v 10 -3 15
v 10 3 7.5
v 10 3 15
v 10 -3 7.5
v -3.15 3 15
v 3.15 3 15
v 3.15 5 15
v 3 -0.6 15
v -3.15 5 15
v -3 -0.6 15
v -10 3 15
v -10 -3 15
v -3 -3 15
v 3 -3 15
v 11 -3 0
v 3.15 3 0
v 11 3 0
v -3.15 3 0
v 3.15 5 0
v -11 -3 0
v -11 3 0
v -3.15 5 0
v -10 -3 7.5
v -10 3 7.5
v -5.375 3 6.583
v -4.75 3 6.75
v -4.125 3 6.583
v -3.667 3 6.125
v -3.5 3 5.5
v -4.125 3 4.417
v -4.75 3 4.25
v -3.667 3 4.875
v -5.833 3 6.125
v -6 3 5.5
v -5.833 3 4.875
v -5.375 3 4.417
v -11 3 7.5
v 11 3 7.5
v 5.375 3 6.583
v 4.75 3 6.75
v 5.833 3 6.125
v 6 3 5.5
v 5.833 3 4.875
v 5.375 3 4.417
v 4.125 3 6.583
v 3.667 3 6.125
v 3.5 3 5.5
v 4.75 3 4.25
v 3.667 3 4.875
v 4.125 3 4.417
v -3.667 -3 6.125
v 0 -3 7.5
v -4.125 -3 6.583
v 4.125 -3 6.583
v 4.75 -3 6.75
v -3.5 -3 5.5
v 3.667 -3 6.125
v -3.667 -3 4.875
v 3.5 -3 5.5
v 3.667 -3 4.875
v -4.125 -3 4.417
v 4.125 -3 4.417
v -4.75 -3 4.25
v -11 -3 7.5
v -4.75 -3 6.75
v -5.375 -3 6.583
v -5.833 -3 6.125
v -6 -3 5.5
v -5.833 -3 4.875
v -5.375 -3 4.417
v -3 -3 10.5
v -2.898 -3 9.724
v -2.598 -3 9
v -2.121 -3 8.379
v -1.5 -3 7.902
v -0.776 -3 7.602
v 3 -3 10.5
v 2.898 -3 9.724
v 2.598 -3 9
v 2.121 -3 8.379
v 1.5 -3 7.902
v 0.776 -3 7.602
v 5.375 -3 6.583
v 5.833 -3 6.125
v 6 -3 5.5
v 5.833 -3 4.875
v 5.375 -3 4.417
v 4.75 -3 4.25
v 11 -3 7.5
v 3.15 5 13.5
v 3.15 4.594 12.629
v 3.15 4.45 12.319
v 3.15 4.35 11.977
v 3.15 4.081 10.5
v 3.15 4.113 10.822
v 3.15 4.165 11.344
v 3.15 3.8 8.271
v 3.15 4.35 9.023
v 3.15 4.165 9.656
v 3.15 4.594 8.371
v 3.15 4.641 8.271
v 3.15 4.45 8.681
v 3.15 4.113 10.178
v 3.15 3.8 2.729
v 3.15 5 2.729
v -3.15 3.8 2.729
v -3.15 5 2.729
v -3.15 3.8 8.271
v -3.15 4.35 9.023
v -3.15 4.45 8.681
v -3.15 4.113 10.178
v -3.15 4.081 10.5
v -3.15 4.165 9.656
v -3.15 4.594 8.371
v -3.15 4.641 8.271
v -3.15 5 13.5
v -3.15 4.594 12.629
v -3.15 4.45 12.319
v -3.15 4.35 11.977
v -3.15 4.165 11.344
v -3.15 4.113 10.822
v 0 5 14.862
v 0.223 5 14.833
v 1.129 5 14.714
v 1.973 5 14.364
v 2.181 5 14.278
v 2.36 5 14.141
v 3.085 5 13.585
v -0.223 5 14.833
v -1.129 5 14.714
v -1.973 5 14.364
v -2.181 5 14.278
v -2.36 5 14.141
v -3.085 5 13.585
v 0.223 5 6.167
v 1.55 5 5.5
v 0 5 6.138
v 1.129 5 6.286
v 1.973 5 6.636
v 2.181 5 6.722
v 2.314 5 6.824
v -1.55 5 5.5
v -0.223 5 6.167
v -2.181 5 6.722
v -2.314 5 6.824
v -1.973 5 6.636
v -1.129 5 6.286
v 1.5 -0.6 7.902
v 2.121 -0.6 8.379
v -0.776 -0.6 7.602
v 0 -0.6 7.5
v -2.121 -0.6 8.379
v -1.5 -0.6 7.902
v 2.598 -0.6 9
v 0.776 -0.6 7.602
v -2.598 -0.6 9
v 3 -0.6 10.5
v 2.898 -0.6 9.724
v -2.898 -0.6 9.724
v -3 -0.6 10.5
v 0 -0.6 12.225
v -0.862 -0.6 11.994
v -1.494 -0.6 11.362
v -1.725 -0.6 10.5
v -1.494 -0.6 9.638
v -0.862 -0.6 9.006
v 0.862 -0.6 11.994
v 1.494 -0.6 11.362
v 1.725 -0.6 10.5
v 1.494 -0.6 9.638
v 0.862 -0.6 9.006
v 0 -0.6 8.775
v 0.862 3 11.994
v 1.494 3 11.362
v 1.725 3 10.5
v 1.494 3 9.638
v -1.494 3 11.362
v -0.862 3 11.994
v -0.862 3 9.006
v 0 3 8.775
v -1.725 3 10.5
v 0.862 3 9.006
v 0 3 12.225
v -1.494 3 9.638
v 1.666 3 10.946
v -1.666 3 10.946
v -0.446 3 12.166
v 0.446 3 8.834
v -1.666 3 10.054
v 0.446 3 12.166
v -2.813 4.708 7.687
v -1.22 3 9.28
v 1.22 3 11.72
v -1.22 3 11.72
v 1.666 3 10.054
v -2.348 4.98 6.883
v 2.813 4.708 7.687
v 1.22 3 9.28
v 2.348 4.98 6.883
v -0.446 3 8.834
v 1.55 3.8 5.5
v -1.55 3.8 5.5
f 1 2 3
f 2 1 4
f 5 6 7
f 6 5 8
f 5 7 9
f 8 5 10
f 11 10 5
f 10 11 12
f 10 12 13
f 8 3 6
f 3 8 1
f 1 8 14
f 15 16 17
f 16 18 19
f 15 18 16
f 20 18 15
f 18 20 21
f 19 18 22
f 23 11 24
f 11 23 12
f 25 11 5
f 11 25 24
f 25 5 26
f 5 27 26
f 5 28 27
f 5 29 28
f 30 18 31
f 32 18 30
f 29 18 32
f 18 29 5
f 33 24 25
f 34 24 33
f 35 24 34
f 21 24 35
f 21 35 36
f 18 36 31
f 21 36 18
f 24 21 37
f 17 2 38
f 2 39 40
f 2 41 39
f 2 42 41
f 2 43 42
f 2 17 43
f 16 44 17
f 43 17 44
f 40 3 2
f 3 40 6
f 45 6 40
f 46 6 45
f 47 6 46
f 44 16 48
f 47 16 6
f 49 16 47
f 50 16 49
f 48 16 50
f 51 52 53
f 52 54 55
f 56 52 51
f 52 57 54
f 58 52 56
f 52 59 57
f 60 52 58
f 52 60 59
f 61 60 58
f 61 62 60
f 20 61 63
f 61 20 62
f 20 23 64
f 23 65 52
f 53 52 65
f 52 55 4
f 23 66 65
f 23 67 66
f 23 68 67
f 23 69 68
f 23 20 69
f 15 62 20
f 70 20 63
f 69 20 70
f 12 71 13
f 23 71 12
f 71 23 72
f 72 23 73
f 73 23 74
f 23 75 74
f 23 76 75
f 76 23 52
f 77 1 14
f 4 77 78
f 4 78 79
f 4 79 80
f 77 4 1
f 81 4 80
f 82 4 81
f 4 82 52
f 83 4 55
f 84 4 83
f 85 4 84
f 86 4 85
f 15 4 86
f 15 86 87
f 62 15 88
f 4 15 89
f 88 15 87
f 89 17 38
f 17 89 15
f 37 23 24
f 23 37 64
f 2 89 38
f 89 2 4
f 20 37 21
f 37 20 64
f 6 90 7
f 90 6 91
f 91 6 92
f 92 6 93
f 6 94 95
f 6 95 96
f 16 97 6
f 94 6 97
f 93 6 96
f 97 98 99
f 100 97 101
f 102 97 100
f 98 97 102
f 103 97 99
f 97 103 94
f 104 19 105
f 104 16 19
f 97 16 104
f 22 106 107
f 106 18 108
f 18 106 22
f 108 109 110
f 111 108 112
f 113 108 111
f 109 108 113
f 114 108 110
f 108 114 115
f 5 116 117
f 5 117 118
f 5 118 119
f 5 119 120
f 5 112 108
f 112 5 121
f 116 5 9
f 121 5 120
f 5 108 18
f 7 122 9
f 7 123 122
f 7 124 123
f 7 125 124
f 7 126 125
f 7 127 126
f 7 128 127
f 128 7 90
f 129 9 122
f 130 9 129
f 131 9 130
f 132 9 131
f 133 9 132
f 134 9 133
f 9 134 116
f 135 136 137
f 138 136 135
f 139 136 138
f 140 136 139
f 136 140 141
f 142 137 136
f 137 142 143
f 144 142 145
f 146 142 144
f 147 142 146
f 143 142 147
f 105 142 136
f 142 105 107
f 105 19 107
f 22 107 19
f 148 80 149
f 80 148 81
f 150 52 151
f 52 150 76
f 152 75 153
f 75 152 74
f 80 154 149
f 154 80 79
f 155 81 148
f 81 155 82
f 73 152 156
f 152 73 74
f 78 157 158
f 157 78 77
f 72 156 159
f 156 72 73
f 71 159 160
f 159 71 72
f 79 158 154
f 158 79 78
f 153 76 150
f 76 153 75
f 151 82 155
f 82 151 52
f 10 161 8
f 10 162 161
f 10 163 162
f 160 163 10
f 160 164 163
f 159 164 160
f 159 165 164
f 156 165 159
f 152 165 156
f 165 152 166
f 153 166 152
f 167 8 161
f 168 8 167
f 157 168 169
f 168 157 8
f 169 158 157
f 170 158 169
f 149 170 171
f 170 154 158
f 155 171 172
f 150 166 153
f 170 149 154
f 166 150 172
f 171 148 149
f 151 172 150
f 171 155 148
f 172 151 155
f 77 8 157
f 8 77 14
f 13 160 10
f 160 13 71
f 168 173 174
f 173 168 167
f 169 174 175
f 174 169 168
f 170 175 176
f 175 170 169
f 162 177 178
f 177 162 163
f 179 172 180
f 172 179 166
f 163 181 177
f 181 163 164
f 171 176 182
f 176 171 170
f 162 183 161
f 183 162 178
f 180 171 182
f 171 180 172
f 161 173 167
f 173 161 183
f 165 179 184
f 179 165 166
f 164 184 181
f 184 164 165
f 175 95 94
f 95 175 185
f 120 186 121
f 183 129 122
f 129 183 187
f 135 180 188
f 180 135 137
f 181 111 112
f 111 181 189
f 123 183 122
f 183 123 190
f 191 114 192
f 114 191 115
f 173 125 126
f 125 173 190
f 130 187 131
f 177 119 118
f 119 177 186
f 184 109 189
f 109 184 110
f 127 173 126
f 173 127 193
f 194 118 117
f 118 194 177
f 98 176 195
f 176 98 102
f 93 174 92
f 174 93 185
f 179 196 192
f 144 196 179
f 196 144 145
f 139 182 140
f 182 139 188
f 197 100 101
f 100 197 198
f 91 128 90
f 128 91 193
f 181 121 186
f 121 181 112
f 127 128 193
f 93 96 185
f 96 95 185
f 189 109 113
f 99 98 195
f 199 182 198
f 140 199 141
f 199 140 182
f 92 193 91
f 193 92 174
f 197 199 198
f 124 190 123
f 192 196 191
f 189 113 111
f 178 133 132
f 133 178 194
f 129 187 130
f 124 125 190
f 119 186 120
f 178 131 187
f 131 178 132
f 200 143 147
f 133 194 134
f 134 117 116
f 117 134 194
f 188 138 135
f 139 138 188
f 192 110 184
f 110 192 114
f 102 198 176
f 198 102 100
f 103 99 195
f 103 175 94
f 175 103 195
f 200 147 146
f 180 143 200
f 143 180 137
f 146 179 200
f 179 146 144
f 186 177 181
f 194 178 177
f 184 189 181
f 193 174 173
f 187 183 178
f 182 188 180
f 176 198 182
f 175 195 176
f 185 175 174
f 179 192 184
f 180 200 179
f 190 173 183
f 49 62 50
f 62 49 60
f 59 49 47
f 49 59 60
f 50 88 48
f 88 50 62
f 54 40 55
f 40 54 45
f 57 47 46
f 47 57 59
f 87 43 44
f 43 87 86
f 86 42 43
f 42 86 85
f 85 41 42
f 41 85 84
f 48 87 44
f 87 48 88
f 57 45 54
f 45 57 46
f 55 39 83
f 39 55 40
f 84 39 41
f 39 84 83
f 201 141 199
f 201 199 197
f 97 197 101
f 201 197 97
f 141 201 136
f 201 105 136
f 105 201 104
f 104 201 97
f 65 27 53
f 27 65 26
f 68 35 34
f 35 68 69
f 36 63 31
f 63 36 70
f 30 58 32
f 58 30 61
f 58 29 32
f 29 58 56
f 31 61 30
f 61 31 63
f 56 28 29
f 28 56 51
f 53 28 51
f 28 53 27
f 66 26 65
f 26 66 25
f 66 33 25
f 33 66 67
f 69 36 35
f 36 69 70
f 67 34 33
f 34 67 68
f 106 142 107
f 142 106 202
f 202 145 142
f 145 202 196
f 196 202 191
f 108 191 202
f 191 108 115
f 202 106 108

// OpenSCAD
// file: microswitch.scad
// Don't print this file, purchase real micro switches
// e.g. Honeywell ZM10B10A01 or OMRON SS-5 or similar.

module microswitch() {
  difference() {
    union() {
      translate([0, 0, 2.5])
        cube([19.8, 6, 10], center=true);
      translate([2.5, 0.5, 6])
        cube([2, 3.5, 5], center=true);
      for (x = [-8, -1, 8]) {
        translate([x, 0, 0])
          cube([0.6, 3.2, 13], center=true);
      }
    }
    for (x = [-9.5/2, 9.5/2]) {
      translate([x, 0, 0]) rotate([90, 0, 0])
        cylinder(r=2.5/2, h=20, center=true, $fn=12);
    }
  }
}

microswitch();
// file: MCAD/nuts_and_bolts.scad
// Copyright 2010 D1plo1d

// This library is dual licensed under the GPL 3.0 and the GNU Lesser General Public License as per http://creativecommons.org/licenses/LGPL/2.1/ .

//testNutsAndBolts();

module SKIPtestNutsAndBolts()
{
	$fn = 360;
	translate([0,15])nutHole(3, proj=2);
	boltHole(3, length= 30, proj=2);
}

MM = "mm";
INCH = "inch"; //Not yet supported

//Based on: http://www.roymech.co.uk/Useful_Tables/Screws/Hex_Screws.htm
METRIC_NUT_AC_WIDTHS =
[
	-1, //0 index is not used but reduces computation
	-1,
	-1,
	6.40,//m3
	8.10,//m4
	9.20,//m5
	11.50,//m6
	-1,
	15.00,//m8
	-1,
	19.60,//m10
	-1,
	22.10,//m12
	-1,
	-1,
	-1,
	27.70,//m16
	-1,
	-1,
	-1,
	34.60,//m20
	-1,
	-1,
	-1,
	41.60,//m24
	-1,
	-1,
	-1,
	-1,
	-1,
	53.1,//m30
	-1,
	-1,
	-1,
	-1,
	-1,
	63.5//m36
];
METRIC_NUT_THICKNESS =
[
	-1, //0 index is not used but reduces computation
	-1,
	-1,
	2.40,//m3
	3.20,//m4
	4.00,//m5
	5.00,//m6
	-1,
	6.50,//m8
	-1,
	8.00,//m10
	-1,
	10.00,//m12
	-1,
	-1,
	-1,
	13.00,//m16
	-1,
	-1,
	-1,
	16.00//m20
	-1,
	-1,
	-1,
	19.00,//m24
	-1,
	-1,
	-1,
	-1,
	-1,
	24.00,//m30
	-1,
	-1,
	-1,
	-1,
	-1,
	29.00//m36
];

COURSE_METRIC_BOLT_MAJOR_THREAD_DIAMETERS =
[//based on max values
	-1, //0 index is not used but reduces computation
	-1,
	-1,
	2.98,//m3
	3.978,//m4
	4.976,//m5
	5.974,//m6
	-1,
	7.972,//m8
	-1,
	9.968,//m10
	-1,
	11.966,//m12
	-1,
	-1,
	-1,
	15.962,//m16
	-1,
	-1,
	-1,
	19.958,//m20
	-1,
	-1,
	-1,
	23.952,//m24
	-1,
	-1,
	-1,
	-1,
	-1,
	29.947,//m30
	-1,
	-1,
	-1,
	-1,
	-1,
	35.940//m36
];

module nutHole(size, units=MM, tolerance = +0.0001, proj = -1)
{
	//takes a metric screw/nut size and looksup nut dimensions
	radius = METRIC_NUT_AC_WIDTHS[size]/2+tolerance;
	height = METRIC_NUT_THICKNESS[size]+tolerance;
	if (proj == -1)
	{
		cylinder(r= radius, h=height, $fn = 6, center=[0,0]);
	}
	if (proj == 1)
	{
		circle(r= radius, $fn = 6);
	}
	if (proj == 2)
	{
		translate([-radius/2, 0])
			square([radius*2, height]);
	}
}

module boltHole(size, units=MM, length, tolerance = +0.0001, proj = -1)
{
	radius = COURSE_METRIC_BOLT_MAJOR_THREAD_DIAMETERS[size]/2+tolerance;
//TODO: proper screw cap values
	capHeight = METRIC_NUT_THICKNESS[size]+tolerance; //METRIC_BOLT_CAP_HEIGHTS[size]+tolerance;
	capRadius = METRIC_NUT_AC_WIDTHS[size]/2+tolerance; //METRIC_BOLT_CAP_RADIUS[size]+tolerance;

	if (proj == -1)
	{
	translate([0, 0, -capHeight])
		cylinder(r= capRadius, h=capHeight);
	cylinder(r = radius, h = length);
	}
	if (proj == 1)
	{
		circle(r = radius);
	}
	if (proj == 2)
	{
		translate([-capRadius/2, -capHeight])
			square([capRadius*2, capHeight]);
		square([radius*2, length]);
	}
}
// file: configuration.scad
// Increase this if your slicer or printer make holes too tight.
extra_radius = 0.1;

// OD = outside diameter, corner to corner.
m3_nut_od = 6.1;
m3_nut_radius = m3_nut_od/2 + 0.2 + extra_radius;
m3_washer_radius = 3.5 + extra_radius;

// Major diameter of metric 3mm thread.
m3_major = 2.85;
m3_radius = m3_major/2 + extra_radius;
m3_wide_radius = m3_major/2 + extra_radius + 0.2;

// NEMA17 stepper motors.
motor_shaft_diameter = 5;
motor_shaft_radius = motor_shaft_diameter/2 + extra_radius;

// Frame brackets. M3x8mm screws work best with 3.6 mm brackets.
thickness = 3.6;

// OpenBeam or Misumi. Currently only 15x15 mm, but there is a plan
// to make models more parametric and allow 20x20 mm in the future.
extrusion = 15;

// Placement for the NEMA17 stepper motors.
motor_offset = 44;
motor_length = 47;
// main file
include <configuration.scad>;
use <MCAD/nuts_and_bolts.scad>;
use <microswitch.scad>;

thickness = 6;  // 1mm thicker than linear rail.
width = 20;  // Same as vertical extrusion.
height = 15;

module endstop() {
  difference() {
    union() {
      cube([width, thickness, height], center=true);
      translate([0, 0, -height/4])
        cube([width+2, thickness, height/2], center=true);
      translate([0, 2, 0])
        cube([6.3, thickness, height], center=true);
    }
    translate([0, 0, 3]) rotate([90, 0, 0]) {
      cylinder(r=m3_wide_radius, h=20, center=true, $fn=12);
      translate([0, 0, 3.6-thickness/2]) {
        cylinder(r=3, h=10, $fn=24);
        translate([0, 5, 5])
          cube([6, 10, 10], center=true);
      }
      translate([0, 0, -thickness/2]) scale([1, 1, -1])
        cylinder(r1=m3_wide_radius, r2=7, h=4, $fn=24);
    }
    translate([0, -3-thickness/2, -2]) rotate([0, 180, 0]) {
      % microswitch();
      for (x = [-9.5/2, 9.5/2]) {
        translate([x, 0, 0]) rotate([90, 0, 0])
          cylinder(r=2.5/2, h=40, center=true, $fn=12);
        translate([x, 12.2,0]) rotate([90,0,0]) nutHole(3);
      }
    }
  }
}

translate([0, 0, height/2]) endstop();
